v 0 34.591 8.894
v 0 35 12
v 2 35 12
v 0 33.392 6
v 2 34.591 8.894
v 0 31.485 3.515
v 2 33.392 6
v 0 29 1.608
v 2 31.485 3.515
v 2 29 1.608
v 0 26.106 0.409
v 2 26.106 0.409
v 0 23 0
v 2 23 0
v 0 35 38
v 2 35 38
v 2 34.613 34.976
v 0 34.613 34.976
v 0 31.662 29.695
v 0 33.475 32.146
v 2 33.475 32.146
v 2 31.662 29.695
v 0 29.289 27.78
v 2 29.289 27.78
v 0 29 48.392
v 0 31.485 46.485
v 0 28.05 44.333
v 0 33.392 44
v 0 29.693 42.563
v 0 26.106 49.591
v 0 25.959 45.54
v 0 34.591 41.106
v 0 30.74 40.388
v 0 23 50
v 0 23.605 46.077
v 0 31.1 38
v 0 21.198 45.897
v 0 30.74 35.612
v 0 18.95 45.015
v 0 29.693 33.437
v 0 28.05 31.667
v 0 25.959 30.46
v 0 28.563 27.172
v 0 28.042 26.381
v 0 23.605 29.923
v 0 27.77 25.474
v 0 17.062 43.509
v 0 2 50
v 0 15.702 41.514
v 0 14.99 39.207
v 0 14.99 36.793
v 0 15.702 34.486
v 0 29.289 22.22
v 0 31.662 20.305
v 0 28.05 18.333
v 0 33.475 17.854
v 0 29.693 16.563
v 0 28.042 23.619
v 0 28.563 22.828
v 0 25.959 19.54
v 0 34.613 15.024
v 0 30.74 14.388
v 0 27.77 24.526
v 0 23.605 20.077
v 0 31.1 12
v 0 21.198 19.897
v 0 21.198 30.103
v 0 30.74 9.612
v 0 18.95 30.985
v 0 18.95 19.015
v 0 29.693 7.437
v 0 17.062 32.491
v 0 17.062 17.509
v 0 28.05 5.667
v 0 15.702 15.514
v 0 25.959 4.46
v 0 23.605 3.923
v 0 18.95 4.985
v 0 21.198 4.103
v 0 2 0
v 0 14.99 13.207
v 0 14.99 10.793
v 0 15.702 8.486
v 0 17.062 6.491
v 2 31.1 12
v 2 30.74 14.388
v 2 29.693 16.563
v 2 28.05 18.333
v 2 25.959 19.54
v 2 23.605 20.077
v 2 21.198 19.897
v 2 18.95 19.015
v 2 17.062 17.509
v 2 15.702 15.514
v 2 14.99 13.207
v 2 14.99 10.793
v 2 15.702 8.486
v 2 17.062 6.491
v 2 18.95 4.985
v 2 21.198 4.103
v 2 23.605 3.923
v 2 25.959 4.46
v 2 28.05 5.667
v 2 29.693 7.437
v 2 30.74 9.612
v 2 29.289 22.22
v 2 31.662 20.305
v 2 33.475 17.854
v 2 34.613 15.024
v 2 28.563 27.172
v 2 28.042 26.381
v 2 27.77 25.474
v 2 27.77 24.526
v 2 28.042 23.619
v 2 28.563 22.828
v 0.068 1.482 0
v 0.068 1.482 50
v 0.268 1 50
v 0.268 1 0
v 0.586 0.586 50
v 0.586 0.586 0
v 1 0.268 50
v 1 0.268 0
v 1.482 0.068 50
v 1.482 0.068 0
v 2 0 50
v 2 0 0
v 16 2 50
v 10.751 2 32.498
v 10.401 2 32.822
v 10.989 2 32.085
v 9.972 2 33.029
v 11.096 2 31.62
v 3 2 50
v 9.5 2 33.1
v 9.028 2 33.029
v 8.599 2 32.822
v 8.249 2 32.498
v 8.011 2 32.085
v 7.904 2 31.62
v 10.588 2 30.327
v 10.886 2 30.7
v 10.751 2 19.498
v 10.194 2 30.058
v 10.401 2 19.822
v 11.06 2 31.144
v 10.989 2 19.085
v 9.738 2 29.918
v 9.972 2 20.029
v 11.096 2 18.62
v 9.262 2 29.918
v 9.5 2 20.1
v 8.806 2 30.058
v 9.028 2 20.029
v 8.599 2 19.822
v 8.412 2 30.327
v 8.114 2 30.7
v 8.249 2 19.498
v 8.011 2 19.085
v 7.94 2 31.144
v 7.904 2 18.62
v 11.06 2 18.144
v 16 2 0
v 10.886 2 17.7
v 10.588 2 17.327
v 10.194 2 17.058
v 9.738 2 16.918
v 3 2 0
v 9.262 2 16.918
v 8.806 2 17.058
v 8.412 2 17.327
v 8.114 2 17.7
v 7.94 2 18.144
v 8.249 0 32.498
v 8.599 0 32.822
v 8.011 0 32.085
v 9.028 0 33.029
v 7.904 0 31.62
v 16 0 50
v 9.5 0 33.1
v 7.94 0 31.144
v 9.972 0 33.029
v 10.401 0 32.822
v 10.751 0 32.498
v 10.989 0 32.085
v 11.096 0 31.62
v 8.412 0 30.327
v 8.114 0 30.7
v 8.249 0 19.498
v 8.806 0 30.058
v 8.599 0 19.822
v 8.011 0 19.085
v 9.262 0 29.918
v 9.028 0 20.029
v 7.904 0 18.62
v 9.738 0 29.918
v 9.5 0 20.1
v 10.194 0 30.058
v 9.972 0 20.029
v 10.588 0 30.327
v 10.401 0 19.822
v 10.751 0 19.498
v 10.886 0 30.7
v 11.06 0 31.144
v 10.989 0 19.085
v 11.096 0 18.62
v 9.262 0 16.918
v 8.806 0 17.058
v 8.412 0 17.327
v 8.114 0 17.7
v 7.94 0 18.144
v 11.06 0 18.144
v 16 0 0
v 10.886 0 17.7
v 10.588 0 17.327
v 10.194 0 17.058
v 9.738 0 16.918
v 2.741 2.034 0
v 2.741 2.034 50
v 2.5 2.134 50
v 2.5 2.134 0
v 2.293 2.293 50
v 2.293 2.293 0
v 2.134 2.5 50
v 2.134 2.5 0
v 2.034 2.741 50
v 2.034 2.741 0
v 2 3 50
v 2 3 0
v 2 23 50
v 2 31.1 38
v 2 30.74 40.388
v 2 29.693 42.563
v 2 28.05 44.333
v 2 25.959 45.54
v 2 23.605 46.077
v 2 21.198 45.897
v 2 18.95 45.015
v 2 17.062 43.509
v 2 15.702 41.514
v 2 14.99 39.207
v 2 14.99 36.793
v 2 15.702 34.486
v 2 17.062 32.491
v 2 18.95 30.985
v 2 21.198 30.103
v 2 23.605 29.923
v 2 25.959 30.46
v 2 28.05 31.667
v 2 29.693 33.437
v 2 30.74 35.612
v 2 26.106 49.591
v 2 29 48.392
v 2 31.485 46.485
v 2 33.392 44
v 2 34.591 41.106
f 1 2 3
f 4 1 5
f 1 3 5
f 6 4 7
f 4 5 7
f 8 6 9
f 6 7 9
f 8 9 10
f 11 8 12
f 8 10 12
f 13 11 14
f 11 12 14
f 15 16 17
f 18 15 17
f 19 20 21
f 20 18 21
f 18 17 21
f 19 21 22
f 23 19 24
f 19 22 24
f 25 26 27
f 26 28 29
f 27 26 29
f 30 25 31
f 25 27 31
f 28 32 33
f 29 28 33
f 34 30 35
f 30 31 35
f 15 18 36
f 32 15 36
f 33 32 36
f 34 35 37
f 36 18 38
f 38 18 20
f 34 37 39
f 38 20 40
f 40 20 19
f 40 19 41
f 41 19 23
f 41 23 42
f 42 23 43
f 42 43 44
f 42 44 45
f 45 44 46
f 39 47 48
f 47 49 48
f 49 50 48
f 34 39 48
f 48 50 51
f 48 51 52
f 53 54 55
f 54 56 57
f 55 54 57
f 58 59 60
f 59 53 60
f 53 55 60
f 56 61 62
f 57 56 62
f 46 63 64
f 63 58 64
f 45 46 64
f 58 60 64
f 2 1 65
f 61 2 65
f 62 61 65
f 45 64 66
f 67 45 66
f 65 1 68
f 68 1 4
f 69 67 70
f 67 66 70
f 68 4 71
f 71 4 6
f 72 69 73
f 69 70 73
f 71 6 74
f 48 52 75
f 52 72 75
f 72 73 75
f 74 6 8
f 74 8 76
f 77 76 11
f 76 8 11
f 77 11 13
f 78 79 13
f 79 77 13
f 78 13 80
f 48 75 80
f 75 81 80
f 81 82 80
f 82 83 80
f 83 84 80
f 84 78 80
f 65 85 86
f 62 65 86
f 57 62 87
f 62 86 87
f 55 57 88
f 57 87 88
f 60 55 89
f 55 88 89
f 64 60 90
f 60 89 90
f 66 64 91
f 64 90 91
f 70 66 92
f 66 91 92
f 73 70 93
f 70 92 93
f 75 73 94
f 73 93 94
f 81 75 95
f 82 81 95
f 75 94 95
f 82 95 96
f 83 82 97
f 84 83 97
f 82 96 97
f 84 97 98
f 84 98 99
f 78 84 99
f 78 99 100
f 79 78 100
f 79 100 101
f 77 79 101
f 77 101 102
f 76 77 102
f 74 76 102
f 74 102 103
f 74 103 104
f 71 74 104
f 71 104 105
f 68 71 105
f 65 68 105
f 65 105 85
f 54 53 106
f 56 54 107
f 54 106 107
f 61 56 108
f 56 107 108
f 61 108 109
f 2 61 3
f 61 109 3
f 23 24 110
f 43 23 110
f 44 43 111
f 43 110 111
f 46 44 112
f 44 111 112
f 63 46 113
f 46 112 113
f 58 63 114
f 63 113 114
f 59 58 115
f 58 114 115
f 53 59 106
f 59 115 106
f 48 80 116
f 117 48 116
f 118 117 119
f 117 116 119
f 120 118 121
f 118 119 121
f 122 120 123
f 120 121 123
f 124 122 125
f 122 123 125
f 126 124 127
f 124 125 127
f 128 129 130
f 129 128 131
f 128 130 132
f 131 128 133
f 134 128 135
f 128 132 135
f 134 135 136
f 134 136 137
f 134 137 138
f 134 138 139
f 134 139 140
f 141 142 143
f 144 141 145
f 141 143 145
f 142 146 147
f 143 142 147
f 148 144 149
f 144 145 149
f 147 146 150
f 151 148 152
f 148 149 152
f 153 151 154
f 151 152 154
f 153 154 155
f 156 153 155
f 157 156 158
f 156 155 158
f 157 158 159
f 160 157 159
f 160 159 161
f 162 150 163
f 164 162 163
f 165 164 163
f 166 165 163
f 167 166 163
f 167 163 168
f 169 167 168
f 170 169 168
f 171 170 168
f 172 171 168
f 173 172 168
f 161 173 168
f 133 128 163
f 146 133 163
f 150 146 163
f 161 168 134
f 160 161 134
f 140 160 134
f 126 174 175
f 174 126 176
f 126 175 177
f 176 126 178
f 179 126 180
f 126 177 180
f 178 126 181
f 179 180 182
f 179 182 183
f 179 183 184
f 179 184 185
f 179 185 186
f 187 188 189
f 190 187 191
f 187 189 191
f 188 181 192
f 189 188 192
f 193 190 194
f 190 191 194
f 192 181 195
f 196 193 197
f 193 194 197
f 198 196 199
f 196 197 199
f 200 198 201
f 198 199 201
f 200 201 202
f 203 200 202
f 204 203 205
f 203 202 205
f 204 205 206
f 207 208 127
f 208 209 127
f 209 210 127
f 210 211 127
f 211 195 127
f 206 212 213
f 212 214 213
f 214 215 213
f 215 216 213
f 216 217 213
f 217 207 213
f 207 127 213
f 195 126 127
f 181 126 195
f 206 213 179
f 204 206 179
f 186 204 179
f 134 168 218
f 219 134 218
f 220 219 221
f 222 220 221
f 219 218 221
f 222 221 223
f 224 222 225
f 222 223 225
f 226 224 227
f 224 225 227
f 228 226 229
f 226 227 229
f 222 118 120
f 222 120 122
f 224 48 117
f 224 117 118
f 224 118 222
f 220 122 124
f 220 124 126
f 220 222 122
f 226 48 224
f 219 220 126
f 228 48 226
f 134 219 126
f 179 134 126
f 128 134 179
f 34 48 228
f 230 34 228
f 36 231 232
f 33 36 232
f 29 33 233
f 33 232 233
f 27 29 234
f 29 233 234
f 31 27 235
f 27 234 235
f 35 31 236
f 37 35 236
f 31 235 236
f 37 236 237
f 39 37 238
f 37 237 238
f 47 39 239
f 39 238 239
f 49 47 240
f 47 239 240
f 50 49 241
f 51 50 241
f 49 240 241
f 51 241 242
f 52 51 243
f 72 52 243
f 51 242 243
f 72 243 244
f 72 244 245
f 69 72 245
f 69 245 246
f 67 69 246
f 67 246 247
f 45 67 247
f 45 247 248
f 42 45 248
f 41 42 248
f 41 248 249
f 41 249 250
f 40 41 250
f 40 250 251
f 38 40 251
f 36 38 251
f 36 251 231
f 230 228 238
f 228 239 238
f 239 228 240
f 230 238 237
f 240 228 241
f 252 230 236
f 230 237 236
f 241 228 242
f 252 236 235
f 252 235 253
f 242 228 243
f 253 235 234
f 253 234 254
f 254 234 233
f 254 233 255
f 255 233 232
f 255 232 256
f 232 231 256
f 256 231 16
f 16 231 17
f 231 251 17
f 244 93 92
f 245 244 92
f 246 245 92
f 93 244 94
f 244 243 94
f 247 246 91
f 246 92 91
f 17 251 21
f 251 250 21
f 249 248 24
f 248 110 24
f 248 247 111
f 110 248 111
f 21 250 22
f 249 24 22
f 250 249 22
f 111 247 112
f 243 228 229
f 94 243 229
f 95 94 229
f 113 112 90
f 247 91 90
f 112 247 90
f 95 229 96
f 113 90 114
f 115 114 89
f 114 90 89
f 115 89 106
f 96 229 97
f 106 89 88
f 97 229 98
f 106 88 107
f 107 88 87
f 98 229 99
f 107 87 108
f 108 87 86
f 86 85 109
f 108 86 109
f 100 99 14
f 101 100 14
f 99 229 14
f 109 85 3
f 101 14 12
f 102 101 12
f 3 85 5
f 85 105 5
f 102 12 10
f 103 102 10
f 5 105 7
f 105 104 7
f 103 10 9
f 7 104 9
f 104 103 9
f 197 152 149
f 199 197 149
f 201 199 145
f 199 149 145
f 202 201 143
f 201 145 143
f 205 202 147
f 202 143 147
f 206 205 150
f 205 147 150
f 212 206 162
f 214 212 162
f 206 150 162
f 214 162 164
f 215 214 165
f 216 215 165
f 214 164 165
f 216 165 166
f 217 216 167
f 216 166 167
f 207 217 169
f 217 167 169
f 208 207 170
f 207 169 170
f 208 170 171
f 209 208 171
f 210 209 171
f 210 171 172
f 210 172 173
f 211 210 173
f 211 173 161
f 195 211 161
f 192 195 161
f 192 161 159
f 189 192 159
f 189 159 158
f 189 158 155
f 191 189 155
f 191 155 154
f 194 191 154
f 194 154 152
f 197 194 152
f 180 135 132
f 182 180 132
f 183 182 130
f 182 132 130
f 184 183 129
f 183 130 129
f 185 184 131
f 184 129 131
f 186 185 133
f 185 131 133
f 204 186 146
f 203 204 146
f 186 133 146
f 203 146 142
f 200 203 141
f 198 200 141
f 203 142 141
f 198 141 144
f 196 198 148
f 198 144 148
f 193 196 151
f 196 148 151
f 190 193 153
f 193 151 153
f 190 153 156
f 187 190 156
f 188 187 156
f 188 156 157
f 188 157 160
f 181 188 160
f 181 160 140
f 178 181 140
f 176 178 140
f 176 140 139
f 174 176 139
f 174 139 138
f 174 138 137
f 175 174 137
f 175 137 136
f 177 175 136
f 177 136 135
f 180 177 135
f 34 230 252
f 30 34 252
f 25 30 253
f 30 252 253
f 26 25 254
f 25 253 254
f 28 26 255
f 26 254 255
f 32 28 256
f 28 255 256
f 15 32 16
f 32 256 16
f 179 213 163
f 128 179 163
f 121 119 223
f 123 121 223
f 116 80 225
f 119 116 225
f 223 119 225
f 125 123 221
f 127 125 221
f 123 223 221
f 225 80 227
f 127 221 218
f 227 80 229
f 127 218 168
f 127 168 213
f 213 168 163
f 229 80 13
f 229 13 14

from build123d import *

# Parameters (mm, degrees)
BOSS_EXTRUDE1_DEPTH = 50
SKETCH2_R           = 1.6
CUT_EXTRUDE1_DEPTH  = 50
SKETCH3_R           = 8.1
CUT_EXTRUDE2_DEPTH  = 50


with BuildPart() as part:
    # Sketch1 → Boss-Extrude1 (new body)
    with BuildSketch(Plane.XY):
        with BuildLine():
            Line((0, 35), (0, 2))
            ThreePointArc((0, 2), (0.585786438, 0.585786438), (2, 0))
            Line((2, 0), (16, 0))
            Line((16, 0), (16, 2))
            Line((16, 2), (3, 2))
            ThreePointArc((3, 2), (2.292893219, 2.292893219), (2, 3))
            Line((2, 3), (2, 35))
            Line((2, 35), (0, 35))
        make_face()
    extrude(amount=BOSS_EXTRUDE1_DEPTH)

    # Sketch2 → Cut-Extrude1 (cut)
    with BuildSketch(Plane(origin=(0, 2, 0), x_dir=(1, 0, 0), z_dir=(0, 1, 0))):
        with Locations(Location((9.5, -18.5, 0), (0, 0, 270))):
            Circle(SKETCH2_R)
        with Locations(Location((9.5, -31.5, 0), (0, 0, 270))):
            Circle(SKETCH2_R)
    extrude(amount=-CUT_EXTRUDE1_DEPTH, mode=Mode.SUBTRACT)

    # Sketch3 → Cut-Extrude2 (cut)
    with BuildSketch(Plane(origin=(2, 0, 0), x_dir=(0, 0, -1), z_dir=(1, 0, 0))):
        with Locations(Location((-12, 23, 0), (0, 0, 90))):
            Circle(SKETCH3_R)
        with Locations(Location((-38, 23, 0), (0, 0, 90))):
            Circle(SKETCH3_R)
        with BuildLine():
            ThreePointArc((-50, 23), (-46.485281374, 31.485281374), (-38, 35))
            Line((-38, 35), (-50, 35))
            Line((-50, 35), (-50, 23))
        make_face()
        with BuildLine():
            ThreePointArc((-22.2198998, 29.289169108), (-17.8536301, 33.475448184), (-12, 35))
            Line((-12, 35), (-38, 35))
            ThreePointArc((-38, 35), (-32.1463699, 33.475448184), (-27.7801002, 29.289169108))
            ThreePointArc((-27.7801002, 29.289169108), (-25, 27.735662478), (-22.2198998, 29.289169108))
        make_face()
        with BuildLine():
            Line((0, 35), (-12, 35))
            ThreePointArc((-12, 35), (-3.514718626, 31.485281374), (0, 23))
            Line((0, 23), (0, 35))
        make_face()
    extrude(amount=-CUT_EXTRUDE2_DEPTH, mode=Mode.SUBTRACT)


solid = part.part
